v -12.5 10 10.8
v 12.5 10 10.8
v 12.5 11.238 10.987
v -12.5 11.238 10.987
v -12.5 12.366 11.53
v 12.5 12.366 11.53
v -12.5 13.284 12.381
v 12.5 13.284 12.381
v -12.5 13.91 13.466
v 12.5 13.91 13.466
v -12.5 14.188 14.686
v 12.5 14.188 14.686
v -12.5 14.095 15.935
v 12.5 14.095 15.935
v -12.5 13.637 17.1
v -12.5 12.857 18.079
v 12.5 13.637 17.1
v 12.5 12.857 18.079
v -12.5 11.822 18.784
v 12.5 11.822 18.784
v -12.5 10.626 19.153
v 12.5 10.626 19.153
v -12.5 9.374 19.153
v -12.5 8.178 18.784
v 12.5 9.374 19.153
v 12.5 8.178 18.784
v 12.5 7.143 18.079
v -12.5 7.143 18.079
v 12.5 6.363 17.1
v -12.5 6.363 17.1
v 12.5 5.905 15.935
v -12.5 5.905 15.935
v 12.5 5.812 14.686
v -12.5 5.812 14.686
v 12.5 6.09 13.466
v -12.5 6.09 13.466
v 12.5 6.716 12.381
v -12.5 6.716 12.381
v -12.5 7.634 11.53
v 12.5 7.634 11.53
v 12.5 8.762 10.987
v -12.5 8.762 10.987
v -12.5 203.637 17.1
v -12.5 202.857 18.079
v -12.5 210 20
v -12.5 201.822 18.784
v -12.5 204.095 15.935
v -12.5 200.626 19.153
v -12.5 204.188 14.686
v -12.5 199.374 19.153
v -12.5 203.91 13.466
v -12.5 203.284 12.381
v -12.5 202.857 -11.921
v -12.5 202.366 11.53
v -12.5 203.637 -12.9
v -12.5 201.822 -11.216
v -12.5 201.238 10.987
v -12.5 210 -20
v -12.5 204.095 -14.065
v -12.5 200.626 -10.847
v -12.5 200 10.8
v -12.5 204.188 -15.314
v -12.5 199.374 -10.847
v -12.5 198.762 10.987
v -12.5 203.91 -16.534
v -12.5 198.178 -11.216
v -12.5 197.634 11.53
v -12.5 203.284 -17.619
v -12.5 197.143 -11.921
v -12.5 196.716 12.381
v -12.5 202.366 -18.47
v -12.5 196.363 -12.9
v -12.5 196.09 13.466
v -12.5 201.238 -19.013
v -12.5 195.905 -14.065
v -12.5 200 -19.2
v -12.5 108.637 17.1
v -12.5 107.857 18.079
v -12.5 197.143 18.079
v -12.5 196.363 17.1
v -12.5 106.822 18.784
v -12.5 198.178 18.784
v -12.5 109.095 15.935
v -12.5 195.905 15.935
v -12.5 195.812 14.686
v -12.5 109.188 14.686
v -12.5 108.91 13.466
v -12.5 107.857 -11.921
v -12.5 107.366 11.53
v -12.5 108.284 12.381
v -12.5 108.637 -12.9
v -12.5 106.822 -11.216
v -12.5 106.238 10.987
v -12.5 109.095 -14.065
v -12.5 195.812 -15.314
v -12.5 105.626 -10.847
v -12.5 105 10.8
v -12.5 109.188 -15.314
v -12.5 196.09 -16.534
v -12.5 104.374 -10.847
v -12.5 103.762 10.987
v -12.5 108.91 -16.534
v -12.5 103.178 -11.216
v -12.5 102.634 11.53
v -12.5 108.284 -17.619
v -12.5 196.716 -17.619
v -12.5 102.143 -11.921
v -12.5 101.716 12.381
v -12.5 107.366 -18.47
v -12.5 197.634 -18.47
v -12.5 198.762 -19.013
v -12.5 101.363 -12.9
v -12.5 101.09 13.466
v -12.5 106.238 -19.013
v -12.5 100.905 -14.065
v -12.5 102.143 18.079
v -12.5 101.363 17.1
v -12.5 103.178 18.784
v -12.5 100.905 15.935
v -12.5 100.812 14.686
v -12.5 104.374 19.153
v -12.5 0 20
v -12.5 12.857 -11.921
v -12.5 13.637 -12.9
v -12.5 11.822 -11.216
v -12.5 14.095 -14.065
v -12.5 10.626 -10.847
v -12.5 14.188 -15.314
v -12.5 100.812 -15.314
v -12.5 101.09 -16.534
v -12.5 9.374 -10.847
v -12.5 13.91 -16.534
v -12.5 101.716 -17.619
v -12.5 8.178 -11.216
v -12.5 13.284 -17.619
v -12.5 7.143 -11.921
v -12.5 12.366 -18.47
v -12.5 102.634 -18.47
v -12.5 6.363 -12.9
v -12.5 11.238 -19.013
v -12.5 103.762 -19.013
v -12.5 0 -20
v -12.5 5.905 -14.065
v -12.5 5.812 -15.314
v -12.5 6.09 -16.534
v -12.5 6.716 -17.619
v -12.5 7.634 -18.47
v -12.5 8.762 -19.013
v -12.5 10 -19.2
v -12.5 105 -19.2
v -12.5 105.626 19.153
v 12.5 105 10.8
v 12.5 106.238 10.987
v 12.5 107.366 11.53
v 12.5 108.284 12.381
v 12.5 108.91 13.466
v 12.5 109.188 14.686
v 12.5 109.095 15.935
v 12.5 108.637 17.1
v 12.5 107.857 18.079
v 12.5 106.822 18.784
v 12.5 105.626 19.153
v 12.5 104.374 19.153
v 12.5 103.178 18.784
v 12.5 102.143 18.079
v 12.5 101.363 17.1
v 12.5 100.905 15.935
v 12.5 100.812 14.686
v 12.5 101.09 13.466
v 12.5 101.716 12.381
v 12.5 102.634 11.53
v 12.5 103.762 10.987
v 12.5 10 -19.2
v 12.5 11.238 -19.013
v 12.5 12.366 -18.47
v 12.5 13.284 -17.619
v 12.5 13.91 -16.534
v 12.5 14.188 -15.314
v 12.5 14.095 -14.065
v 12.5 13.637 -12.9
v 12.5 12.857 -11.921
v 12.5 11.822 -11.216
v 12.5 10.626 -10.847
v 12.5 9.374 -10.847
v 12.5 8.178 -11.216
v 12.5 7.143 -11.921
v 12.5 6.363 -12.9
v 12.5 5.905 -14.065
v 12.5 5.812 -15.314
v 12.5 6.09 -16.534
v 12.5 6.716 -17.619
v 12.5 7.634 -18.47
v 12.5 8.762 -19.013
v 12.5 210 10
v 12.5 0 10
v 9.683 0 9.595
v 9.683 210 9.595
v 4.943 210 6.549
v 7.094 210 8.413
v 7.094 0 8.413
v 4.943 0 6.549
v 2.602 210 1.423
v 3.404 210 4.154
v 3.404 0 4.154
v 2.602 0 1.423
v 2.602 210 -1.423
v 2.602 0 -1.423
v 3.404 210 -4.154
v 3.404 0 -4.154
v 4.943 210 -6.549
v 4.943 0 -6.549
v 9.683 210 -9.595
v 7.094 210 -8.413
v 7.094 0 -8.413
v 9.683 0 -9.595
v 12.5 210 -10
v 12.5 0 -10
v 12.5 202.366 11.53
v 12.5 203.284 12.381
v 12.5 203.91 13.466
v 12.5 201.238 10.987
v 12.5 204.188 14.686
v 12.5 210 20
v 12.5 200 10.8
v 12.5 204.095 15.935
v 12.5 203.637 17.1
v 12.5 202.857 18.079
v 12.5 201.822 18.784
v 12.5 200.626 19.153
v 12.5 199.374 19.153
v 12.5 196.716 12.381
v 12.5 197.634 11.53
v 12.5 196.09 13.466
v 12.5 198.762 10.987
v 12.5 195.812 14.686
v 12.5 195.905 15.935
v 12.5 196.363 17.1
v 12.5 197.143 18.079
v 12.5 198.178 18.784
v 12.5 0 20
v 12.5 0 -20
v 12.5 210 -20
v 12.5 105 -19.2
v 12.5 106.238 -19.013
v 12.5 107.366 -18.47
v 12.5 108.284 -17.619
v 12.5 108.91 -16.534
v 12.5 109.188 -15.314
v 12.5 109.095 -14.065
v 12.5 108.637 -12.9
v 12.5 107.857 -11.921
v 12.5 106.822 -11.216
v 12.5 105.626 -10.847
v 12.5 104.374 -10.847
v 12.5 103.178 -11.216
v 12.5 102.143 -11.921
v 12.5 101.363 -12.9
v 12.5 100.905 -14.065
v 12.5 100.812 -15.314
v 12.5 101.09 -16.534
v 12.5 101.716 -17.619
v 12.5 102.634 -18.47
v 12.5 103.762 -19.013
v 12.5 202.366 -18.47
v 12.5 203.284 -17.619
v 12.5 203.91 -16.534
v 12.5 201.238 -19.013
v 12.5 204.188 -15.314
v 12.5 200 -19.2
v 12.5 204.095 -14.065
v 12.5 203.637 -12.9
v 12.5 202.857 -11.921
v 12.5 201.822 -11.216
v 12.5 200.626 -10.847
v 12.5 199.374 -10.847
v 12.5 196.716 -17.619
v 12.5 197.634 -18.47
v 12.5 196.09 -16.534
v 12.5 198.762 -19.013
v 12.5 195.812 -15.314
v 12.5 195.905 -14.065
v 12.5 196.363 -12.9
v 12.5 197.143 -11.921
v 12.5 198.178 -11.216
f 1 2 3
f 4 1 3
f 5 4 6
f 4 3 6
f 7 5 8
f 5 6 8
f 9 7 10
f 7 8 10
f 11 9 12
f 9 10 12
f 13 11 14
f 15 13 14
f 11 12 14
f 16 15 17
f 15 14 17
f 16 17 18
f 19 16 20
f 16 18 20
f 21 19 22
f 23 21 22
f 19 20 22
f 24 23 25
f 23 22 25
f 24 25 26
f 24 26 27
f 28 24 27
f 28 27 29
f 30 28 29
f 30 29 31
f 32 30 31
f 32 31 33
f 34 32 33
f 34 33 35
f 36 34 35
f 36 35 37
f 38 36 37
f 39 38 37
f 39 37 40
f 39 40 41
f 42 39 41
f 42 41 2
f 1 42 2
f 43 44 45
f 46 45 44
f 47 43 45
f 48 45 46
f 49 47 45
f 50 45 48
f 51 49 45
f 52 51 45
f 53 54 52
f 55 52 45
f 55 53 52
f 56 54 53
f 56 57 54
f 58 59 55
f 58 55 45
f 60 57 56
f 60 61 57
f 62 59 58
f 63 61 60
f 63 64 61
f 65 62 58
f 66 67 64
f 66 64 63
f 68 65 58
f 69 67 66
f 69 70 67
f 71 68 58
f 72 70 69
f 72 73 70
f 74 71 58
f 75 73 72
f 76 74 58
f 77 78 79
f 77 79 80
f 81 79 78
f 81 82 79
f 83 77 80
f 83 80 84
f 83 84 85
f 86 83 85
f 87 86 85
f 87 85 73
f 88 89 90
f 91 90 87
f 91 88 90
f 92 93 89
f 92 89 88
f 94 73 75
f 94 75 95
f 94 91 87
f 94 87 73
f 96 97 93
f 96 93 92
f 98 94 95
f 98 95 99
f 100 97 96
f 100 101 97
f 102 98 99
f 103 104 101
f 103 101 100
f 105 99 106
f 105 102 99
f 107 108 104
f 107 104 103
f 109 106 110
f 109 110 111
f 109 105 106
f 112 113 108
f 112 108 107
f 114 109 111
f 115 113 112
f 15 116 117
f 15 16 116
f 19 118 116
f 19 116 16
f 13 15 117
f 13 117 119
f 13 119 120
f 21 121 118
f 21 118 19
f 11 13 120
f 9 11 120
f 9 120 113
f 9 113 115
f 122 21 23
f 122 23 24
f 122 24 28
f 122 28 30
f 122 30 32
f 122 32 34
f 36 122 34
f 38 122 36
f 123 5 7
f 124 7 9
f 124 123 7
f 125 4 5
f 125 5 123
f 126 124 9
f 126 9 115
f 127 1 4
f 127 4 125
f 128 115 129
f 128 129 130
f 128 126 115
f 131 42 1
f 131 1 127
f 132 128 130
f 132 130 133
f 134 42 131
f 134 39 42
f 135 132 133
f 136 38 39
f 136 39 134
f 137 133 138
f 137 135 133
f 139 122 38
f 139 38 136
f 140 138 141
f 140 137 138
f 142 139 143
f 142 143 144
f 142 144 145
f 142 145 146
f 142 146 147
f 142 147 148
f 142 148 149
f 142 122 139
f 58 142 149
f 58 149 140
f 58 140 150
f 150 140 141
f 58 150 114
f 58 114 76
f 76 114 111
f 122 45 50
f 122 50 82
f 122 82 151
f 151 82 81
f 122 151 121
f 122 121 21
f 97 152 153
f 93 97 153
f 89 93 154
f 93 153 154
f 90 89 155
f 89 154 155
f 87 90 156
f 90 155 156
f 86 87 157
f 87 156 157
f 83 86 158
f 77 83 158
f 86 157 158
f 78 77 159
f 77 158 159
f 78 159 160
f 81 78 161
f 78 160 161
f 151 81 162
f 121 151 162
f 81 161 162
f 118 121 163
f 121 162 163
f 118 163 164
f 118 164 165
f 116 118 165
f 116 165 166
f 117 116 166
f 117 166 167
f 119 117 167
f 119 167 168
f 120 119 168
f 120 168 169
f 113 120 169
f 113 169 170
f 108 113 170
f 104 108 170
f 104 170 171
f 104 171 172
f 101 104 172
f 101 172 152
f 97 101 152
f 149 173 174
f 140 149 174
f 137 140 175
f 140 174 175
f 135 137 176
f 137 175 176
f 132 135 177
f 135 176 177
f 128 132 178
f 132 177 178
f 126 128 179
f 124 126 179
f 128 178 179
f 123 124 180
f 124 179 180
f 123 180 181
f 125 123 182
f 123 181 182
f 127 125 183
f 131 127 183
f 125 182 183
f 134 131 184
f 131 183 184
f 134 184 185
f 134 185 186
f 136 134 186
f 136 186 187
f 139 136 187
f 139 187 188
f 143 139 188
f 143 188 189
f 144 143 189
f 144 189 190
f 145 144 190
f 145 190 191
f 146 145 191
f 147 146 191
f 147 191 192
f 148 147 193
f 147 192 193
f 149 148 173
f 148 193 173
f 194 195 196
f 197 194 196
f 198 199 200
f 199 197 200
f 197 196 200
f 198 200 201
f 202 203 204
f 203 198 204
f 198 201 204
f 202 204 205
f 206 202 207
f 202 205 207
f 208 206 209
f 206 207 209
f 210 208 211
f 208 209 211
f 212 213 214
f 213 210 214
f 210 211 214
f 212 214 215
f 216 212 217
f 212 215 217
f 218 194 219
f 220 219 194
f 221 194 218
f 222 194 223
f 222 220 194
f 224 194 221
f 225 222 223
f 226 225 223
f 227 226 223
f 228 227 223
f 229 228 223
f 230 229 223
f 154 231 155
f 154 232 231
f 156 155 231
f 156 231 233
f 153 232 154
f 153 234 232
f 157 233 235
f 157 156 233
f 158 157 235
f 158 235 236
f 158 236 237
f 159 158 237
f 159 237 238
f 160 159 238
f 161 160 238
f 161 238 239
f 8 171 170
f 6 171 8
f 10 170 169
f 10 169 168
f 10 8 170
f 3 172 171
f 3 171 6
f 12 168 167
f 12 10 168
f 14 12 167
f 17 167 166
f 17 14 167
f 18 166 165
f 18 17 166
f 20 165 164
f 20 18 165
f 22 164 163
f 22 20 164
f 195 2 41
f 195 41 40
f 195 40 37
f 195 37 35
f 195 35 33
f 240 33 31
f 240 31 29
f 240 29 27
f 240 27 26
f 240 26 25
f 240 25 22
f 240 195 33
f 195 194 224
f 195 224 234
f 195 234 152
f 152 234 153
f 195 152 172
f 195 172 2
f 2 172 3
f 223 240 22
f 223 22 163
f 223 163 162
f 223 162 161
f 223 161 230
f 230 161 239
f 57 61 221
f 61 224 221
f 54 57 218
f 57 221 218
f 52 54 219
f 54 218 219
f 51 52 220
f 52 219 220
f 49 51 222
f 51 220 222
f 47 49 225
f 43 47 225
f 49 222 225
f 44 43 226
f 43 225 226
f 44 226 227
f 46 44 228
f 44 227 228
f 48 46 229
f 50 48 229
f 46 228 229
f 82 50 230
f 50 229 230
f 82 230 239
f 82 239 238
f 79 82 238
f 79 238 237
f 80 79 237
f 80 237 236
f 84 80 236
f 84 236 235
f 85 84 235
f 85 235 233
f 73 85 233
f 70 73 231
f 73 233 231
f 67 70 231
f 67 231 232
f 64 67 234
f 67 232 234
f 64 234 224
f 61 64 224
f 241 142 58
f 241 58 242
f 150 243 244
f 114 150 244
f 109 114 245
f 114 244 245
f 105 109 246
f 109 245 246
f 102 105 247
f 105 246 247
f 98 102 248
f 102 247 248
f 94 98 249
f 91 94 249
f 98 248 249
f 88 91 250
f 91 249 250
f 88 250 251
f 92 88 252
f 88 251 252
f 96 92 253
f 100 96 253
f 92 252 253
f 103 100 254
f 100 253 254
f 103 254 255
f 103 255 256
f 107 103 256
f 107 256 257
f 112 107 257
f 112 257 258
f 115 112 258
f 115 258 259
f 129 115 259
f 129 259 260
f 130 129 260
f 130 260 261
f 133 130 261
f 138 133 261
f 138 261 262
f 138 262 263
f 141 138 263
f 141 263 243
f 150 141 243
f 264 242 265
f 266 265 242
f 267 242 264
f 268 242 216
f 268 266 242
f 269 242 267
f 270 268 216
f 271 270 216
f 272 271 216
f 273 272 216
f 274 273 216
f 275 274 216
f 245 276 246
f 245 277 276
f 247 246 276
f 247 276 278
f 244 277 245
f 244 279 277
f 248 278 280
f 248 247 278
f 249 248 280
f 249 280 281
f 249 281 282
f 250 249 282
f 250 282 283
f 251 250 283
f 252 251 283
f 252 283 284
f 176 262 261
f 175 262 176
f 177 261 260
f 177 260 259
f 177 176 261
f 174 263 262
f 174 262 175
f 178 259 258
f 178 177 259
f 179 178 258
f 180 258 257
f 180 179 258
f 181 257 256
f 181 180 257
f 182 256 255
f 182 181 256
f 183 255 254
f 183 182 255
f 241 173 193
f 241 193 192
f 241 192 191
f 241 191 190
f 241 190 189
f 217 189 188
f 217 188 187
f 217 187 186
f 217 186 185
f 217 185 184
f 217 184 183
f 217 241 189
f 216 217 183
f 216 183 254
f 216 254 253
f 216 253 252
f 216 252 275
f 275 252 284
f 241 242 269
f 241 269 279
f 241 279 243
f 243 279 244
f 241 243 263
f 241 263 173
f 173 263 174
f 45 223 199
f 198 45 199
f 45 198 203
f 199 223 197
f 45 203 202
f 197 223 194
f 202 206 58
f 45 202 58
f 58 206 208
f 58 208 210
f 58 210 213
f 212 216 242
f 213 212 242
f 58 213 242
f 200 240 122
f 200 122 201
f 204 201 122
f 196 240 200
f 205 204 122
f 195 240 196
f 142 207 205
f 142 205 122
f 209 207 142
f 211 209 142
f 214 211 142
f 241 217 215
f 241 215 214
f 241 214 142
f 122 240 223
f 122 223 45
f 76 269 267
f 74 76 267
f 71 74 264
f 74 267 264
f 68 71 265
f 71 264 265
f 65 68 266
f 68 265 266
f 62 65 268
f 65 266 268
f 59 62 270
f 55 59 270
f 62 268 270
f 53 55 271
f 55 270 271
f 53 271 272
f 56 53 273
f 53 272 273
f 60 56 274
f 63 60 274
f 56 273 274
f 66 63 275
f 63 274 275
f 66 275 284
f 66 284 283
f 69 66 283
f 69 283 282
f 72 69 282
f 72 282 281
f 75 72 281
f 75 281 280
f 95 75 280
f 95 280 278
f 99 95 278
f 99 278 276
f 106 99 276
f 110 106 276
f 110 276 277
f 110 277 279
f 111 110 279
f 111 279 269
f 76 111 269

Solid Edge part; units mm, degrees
sketch "Sketch1" plane through (0, 0, 0) normal (0, -1, 0) x (1, 0, 0)
  line L0 (-12.5, -20) -> (12.5, -20)
  line L1 (12.5, -20) -> (12.5, -10)
  line L2 (12.5, 10) -> (12.5, 20)
  line L3 (12.5, 20) -> (-12.5, 20)
  line L4 (-12.5, 20) -> (-12.5, -20)
  arc A0 (12.5, -10) -> (12.5, 10) centre (12.5, 0) cw
  dimension "D1" = 10
  dimension "D2" = 25
  dimension "D3" = 20
  dimension "D4" = 40
  dimension "D5" = 10
extrude "Protrusion1" add sketch "Sketch1" against normal blind 210
hole "Hole_1" at (12.5, 10, 15) direction (-1, 0, 0) diameter 8.4 end up to next
hole "Hole1" at (12.5, 10, -15) direction (-1, 0, 0) diameter 8.4 end up to next
hole "Hole2" at (12.5, 105, -15) direction (-1, 0, 0) diameter 8.4 end up to next
hole "Hole3" at (12.5, 105, 15) direction (-1, 0, 0) diameter 8.4 end up to next
hole "Hole4" at (12.5, 200, 15) direction (-1, 0, 0) diameter 8.4 end up to next
hole "Hole5" at (12.5, 200, -15) direction (-1, 0, 0) diameter 8.4 end up to next
properties material "Stainless Steel, 420"
